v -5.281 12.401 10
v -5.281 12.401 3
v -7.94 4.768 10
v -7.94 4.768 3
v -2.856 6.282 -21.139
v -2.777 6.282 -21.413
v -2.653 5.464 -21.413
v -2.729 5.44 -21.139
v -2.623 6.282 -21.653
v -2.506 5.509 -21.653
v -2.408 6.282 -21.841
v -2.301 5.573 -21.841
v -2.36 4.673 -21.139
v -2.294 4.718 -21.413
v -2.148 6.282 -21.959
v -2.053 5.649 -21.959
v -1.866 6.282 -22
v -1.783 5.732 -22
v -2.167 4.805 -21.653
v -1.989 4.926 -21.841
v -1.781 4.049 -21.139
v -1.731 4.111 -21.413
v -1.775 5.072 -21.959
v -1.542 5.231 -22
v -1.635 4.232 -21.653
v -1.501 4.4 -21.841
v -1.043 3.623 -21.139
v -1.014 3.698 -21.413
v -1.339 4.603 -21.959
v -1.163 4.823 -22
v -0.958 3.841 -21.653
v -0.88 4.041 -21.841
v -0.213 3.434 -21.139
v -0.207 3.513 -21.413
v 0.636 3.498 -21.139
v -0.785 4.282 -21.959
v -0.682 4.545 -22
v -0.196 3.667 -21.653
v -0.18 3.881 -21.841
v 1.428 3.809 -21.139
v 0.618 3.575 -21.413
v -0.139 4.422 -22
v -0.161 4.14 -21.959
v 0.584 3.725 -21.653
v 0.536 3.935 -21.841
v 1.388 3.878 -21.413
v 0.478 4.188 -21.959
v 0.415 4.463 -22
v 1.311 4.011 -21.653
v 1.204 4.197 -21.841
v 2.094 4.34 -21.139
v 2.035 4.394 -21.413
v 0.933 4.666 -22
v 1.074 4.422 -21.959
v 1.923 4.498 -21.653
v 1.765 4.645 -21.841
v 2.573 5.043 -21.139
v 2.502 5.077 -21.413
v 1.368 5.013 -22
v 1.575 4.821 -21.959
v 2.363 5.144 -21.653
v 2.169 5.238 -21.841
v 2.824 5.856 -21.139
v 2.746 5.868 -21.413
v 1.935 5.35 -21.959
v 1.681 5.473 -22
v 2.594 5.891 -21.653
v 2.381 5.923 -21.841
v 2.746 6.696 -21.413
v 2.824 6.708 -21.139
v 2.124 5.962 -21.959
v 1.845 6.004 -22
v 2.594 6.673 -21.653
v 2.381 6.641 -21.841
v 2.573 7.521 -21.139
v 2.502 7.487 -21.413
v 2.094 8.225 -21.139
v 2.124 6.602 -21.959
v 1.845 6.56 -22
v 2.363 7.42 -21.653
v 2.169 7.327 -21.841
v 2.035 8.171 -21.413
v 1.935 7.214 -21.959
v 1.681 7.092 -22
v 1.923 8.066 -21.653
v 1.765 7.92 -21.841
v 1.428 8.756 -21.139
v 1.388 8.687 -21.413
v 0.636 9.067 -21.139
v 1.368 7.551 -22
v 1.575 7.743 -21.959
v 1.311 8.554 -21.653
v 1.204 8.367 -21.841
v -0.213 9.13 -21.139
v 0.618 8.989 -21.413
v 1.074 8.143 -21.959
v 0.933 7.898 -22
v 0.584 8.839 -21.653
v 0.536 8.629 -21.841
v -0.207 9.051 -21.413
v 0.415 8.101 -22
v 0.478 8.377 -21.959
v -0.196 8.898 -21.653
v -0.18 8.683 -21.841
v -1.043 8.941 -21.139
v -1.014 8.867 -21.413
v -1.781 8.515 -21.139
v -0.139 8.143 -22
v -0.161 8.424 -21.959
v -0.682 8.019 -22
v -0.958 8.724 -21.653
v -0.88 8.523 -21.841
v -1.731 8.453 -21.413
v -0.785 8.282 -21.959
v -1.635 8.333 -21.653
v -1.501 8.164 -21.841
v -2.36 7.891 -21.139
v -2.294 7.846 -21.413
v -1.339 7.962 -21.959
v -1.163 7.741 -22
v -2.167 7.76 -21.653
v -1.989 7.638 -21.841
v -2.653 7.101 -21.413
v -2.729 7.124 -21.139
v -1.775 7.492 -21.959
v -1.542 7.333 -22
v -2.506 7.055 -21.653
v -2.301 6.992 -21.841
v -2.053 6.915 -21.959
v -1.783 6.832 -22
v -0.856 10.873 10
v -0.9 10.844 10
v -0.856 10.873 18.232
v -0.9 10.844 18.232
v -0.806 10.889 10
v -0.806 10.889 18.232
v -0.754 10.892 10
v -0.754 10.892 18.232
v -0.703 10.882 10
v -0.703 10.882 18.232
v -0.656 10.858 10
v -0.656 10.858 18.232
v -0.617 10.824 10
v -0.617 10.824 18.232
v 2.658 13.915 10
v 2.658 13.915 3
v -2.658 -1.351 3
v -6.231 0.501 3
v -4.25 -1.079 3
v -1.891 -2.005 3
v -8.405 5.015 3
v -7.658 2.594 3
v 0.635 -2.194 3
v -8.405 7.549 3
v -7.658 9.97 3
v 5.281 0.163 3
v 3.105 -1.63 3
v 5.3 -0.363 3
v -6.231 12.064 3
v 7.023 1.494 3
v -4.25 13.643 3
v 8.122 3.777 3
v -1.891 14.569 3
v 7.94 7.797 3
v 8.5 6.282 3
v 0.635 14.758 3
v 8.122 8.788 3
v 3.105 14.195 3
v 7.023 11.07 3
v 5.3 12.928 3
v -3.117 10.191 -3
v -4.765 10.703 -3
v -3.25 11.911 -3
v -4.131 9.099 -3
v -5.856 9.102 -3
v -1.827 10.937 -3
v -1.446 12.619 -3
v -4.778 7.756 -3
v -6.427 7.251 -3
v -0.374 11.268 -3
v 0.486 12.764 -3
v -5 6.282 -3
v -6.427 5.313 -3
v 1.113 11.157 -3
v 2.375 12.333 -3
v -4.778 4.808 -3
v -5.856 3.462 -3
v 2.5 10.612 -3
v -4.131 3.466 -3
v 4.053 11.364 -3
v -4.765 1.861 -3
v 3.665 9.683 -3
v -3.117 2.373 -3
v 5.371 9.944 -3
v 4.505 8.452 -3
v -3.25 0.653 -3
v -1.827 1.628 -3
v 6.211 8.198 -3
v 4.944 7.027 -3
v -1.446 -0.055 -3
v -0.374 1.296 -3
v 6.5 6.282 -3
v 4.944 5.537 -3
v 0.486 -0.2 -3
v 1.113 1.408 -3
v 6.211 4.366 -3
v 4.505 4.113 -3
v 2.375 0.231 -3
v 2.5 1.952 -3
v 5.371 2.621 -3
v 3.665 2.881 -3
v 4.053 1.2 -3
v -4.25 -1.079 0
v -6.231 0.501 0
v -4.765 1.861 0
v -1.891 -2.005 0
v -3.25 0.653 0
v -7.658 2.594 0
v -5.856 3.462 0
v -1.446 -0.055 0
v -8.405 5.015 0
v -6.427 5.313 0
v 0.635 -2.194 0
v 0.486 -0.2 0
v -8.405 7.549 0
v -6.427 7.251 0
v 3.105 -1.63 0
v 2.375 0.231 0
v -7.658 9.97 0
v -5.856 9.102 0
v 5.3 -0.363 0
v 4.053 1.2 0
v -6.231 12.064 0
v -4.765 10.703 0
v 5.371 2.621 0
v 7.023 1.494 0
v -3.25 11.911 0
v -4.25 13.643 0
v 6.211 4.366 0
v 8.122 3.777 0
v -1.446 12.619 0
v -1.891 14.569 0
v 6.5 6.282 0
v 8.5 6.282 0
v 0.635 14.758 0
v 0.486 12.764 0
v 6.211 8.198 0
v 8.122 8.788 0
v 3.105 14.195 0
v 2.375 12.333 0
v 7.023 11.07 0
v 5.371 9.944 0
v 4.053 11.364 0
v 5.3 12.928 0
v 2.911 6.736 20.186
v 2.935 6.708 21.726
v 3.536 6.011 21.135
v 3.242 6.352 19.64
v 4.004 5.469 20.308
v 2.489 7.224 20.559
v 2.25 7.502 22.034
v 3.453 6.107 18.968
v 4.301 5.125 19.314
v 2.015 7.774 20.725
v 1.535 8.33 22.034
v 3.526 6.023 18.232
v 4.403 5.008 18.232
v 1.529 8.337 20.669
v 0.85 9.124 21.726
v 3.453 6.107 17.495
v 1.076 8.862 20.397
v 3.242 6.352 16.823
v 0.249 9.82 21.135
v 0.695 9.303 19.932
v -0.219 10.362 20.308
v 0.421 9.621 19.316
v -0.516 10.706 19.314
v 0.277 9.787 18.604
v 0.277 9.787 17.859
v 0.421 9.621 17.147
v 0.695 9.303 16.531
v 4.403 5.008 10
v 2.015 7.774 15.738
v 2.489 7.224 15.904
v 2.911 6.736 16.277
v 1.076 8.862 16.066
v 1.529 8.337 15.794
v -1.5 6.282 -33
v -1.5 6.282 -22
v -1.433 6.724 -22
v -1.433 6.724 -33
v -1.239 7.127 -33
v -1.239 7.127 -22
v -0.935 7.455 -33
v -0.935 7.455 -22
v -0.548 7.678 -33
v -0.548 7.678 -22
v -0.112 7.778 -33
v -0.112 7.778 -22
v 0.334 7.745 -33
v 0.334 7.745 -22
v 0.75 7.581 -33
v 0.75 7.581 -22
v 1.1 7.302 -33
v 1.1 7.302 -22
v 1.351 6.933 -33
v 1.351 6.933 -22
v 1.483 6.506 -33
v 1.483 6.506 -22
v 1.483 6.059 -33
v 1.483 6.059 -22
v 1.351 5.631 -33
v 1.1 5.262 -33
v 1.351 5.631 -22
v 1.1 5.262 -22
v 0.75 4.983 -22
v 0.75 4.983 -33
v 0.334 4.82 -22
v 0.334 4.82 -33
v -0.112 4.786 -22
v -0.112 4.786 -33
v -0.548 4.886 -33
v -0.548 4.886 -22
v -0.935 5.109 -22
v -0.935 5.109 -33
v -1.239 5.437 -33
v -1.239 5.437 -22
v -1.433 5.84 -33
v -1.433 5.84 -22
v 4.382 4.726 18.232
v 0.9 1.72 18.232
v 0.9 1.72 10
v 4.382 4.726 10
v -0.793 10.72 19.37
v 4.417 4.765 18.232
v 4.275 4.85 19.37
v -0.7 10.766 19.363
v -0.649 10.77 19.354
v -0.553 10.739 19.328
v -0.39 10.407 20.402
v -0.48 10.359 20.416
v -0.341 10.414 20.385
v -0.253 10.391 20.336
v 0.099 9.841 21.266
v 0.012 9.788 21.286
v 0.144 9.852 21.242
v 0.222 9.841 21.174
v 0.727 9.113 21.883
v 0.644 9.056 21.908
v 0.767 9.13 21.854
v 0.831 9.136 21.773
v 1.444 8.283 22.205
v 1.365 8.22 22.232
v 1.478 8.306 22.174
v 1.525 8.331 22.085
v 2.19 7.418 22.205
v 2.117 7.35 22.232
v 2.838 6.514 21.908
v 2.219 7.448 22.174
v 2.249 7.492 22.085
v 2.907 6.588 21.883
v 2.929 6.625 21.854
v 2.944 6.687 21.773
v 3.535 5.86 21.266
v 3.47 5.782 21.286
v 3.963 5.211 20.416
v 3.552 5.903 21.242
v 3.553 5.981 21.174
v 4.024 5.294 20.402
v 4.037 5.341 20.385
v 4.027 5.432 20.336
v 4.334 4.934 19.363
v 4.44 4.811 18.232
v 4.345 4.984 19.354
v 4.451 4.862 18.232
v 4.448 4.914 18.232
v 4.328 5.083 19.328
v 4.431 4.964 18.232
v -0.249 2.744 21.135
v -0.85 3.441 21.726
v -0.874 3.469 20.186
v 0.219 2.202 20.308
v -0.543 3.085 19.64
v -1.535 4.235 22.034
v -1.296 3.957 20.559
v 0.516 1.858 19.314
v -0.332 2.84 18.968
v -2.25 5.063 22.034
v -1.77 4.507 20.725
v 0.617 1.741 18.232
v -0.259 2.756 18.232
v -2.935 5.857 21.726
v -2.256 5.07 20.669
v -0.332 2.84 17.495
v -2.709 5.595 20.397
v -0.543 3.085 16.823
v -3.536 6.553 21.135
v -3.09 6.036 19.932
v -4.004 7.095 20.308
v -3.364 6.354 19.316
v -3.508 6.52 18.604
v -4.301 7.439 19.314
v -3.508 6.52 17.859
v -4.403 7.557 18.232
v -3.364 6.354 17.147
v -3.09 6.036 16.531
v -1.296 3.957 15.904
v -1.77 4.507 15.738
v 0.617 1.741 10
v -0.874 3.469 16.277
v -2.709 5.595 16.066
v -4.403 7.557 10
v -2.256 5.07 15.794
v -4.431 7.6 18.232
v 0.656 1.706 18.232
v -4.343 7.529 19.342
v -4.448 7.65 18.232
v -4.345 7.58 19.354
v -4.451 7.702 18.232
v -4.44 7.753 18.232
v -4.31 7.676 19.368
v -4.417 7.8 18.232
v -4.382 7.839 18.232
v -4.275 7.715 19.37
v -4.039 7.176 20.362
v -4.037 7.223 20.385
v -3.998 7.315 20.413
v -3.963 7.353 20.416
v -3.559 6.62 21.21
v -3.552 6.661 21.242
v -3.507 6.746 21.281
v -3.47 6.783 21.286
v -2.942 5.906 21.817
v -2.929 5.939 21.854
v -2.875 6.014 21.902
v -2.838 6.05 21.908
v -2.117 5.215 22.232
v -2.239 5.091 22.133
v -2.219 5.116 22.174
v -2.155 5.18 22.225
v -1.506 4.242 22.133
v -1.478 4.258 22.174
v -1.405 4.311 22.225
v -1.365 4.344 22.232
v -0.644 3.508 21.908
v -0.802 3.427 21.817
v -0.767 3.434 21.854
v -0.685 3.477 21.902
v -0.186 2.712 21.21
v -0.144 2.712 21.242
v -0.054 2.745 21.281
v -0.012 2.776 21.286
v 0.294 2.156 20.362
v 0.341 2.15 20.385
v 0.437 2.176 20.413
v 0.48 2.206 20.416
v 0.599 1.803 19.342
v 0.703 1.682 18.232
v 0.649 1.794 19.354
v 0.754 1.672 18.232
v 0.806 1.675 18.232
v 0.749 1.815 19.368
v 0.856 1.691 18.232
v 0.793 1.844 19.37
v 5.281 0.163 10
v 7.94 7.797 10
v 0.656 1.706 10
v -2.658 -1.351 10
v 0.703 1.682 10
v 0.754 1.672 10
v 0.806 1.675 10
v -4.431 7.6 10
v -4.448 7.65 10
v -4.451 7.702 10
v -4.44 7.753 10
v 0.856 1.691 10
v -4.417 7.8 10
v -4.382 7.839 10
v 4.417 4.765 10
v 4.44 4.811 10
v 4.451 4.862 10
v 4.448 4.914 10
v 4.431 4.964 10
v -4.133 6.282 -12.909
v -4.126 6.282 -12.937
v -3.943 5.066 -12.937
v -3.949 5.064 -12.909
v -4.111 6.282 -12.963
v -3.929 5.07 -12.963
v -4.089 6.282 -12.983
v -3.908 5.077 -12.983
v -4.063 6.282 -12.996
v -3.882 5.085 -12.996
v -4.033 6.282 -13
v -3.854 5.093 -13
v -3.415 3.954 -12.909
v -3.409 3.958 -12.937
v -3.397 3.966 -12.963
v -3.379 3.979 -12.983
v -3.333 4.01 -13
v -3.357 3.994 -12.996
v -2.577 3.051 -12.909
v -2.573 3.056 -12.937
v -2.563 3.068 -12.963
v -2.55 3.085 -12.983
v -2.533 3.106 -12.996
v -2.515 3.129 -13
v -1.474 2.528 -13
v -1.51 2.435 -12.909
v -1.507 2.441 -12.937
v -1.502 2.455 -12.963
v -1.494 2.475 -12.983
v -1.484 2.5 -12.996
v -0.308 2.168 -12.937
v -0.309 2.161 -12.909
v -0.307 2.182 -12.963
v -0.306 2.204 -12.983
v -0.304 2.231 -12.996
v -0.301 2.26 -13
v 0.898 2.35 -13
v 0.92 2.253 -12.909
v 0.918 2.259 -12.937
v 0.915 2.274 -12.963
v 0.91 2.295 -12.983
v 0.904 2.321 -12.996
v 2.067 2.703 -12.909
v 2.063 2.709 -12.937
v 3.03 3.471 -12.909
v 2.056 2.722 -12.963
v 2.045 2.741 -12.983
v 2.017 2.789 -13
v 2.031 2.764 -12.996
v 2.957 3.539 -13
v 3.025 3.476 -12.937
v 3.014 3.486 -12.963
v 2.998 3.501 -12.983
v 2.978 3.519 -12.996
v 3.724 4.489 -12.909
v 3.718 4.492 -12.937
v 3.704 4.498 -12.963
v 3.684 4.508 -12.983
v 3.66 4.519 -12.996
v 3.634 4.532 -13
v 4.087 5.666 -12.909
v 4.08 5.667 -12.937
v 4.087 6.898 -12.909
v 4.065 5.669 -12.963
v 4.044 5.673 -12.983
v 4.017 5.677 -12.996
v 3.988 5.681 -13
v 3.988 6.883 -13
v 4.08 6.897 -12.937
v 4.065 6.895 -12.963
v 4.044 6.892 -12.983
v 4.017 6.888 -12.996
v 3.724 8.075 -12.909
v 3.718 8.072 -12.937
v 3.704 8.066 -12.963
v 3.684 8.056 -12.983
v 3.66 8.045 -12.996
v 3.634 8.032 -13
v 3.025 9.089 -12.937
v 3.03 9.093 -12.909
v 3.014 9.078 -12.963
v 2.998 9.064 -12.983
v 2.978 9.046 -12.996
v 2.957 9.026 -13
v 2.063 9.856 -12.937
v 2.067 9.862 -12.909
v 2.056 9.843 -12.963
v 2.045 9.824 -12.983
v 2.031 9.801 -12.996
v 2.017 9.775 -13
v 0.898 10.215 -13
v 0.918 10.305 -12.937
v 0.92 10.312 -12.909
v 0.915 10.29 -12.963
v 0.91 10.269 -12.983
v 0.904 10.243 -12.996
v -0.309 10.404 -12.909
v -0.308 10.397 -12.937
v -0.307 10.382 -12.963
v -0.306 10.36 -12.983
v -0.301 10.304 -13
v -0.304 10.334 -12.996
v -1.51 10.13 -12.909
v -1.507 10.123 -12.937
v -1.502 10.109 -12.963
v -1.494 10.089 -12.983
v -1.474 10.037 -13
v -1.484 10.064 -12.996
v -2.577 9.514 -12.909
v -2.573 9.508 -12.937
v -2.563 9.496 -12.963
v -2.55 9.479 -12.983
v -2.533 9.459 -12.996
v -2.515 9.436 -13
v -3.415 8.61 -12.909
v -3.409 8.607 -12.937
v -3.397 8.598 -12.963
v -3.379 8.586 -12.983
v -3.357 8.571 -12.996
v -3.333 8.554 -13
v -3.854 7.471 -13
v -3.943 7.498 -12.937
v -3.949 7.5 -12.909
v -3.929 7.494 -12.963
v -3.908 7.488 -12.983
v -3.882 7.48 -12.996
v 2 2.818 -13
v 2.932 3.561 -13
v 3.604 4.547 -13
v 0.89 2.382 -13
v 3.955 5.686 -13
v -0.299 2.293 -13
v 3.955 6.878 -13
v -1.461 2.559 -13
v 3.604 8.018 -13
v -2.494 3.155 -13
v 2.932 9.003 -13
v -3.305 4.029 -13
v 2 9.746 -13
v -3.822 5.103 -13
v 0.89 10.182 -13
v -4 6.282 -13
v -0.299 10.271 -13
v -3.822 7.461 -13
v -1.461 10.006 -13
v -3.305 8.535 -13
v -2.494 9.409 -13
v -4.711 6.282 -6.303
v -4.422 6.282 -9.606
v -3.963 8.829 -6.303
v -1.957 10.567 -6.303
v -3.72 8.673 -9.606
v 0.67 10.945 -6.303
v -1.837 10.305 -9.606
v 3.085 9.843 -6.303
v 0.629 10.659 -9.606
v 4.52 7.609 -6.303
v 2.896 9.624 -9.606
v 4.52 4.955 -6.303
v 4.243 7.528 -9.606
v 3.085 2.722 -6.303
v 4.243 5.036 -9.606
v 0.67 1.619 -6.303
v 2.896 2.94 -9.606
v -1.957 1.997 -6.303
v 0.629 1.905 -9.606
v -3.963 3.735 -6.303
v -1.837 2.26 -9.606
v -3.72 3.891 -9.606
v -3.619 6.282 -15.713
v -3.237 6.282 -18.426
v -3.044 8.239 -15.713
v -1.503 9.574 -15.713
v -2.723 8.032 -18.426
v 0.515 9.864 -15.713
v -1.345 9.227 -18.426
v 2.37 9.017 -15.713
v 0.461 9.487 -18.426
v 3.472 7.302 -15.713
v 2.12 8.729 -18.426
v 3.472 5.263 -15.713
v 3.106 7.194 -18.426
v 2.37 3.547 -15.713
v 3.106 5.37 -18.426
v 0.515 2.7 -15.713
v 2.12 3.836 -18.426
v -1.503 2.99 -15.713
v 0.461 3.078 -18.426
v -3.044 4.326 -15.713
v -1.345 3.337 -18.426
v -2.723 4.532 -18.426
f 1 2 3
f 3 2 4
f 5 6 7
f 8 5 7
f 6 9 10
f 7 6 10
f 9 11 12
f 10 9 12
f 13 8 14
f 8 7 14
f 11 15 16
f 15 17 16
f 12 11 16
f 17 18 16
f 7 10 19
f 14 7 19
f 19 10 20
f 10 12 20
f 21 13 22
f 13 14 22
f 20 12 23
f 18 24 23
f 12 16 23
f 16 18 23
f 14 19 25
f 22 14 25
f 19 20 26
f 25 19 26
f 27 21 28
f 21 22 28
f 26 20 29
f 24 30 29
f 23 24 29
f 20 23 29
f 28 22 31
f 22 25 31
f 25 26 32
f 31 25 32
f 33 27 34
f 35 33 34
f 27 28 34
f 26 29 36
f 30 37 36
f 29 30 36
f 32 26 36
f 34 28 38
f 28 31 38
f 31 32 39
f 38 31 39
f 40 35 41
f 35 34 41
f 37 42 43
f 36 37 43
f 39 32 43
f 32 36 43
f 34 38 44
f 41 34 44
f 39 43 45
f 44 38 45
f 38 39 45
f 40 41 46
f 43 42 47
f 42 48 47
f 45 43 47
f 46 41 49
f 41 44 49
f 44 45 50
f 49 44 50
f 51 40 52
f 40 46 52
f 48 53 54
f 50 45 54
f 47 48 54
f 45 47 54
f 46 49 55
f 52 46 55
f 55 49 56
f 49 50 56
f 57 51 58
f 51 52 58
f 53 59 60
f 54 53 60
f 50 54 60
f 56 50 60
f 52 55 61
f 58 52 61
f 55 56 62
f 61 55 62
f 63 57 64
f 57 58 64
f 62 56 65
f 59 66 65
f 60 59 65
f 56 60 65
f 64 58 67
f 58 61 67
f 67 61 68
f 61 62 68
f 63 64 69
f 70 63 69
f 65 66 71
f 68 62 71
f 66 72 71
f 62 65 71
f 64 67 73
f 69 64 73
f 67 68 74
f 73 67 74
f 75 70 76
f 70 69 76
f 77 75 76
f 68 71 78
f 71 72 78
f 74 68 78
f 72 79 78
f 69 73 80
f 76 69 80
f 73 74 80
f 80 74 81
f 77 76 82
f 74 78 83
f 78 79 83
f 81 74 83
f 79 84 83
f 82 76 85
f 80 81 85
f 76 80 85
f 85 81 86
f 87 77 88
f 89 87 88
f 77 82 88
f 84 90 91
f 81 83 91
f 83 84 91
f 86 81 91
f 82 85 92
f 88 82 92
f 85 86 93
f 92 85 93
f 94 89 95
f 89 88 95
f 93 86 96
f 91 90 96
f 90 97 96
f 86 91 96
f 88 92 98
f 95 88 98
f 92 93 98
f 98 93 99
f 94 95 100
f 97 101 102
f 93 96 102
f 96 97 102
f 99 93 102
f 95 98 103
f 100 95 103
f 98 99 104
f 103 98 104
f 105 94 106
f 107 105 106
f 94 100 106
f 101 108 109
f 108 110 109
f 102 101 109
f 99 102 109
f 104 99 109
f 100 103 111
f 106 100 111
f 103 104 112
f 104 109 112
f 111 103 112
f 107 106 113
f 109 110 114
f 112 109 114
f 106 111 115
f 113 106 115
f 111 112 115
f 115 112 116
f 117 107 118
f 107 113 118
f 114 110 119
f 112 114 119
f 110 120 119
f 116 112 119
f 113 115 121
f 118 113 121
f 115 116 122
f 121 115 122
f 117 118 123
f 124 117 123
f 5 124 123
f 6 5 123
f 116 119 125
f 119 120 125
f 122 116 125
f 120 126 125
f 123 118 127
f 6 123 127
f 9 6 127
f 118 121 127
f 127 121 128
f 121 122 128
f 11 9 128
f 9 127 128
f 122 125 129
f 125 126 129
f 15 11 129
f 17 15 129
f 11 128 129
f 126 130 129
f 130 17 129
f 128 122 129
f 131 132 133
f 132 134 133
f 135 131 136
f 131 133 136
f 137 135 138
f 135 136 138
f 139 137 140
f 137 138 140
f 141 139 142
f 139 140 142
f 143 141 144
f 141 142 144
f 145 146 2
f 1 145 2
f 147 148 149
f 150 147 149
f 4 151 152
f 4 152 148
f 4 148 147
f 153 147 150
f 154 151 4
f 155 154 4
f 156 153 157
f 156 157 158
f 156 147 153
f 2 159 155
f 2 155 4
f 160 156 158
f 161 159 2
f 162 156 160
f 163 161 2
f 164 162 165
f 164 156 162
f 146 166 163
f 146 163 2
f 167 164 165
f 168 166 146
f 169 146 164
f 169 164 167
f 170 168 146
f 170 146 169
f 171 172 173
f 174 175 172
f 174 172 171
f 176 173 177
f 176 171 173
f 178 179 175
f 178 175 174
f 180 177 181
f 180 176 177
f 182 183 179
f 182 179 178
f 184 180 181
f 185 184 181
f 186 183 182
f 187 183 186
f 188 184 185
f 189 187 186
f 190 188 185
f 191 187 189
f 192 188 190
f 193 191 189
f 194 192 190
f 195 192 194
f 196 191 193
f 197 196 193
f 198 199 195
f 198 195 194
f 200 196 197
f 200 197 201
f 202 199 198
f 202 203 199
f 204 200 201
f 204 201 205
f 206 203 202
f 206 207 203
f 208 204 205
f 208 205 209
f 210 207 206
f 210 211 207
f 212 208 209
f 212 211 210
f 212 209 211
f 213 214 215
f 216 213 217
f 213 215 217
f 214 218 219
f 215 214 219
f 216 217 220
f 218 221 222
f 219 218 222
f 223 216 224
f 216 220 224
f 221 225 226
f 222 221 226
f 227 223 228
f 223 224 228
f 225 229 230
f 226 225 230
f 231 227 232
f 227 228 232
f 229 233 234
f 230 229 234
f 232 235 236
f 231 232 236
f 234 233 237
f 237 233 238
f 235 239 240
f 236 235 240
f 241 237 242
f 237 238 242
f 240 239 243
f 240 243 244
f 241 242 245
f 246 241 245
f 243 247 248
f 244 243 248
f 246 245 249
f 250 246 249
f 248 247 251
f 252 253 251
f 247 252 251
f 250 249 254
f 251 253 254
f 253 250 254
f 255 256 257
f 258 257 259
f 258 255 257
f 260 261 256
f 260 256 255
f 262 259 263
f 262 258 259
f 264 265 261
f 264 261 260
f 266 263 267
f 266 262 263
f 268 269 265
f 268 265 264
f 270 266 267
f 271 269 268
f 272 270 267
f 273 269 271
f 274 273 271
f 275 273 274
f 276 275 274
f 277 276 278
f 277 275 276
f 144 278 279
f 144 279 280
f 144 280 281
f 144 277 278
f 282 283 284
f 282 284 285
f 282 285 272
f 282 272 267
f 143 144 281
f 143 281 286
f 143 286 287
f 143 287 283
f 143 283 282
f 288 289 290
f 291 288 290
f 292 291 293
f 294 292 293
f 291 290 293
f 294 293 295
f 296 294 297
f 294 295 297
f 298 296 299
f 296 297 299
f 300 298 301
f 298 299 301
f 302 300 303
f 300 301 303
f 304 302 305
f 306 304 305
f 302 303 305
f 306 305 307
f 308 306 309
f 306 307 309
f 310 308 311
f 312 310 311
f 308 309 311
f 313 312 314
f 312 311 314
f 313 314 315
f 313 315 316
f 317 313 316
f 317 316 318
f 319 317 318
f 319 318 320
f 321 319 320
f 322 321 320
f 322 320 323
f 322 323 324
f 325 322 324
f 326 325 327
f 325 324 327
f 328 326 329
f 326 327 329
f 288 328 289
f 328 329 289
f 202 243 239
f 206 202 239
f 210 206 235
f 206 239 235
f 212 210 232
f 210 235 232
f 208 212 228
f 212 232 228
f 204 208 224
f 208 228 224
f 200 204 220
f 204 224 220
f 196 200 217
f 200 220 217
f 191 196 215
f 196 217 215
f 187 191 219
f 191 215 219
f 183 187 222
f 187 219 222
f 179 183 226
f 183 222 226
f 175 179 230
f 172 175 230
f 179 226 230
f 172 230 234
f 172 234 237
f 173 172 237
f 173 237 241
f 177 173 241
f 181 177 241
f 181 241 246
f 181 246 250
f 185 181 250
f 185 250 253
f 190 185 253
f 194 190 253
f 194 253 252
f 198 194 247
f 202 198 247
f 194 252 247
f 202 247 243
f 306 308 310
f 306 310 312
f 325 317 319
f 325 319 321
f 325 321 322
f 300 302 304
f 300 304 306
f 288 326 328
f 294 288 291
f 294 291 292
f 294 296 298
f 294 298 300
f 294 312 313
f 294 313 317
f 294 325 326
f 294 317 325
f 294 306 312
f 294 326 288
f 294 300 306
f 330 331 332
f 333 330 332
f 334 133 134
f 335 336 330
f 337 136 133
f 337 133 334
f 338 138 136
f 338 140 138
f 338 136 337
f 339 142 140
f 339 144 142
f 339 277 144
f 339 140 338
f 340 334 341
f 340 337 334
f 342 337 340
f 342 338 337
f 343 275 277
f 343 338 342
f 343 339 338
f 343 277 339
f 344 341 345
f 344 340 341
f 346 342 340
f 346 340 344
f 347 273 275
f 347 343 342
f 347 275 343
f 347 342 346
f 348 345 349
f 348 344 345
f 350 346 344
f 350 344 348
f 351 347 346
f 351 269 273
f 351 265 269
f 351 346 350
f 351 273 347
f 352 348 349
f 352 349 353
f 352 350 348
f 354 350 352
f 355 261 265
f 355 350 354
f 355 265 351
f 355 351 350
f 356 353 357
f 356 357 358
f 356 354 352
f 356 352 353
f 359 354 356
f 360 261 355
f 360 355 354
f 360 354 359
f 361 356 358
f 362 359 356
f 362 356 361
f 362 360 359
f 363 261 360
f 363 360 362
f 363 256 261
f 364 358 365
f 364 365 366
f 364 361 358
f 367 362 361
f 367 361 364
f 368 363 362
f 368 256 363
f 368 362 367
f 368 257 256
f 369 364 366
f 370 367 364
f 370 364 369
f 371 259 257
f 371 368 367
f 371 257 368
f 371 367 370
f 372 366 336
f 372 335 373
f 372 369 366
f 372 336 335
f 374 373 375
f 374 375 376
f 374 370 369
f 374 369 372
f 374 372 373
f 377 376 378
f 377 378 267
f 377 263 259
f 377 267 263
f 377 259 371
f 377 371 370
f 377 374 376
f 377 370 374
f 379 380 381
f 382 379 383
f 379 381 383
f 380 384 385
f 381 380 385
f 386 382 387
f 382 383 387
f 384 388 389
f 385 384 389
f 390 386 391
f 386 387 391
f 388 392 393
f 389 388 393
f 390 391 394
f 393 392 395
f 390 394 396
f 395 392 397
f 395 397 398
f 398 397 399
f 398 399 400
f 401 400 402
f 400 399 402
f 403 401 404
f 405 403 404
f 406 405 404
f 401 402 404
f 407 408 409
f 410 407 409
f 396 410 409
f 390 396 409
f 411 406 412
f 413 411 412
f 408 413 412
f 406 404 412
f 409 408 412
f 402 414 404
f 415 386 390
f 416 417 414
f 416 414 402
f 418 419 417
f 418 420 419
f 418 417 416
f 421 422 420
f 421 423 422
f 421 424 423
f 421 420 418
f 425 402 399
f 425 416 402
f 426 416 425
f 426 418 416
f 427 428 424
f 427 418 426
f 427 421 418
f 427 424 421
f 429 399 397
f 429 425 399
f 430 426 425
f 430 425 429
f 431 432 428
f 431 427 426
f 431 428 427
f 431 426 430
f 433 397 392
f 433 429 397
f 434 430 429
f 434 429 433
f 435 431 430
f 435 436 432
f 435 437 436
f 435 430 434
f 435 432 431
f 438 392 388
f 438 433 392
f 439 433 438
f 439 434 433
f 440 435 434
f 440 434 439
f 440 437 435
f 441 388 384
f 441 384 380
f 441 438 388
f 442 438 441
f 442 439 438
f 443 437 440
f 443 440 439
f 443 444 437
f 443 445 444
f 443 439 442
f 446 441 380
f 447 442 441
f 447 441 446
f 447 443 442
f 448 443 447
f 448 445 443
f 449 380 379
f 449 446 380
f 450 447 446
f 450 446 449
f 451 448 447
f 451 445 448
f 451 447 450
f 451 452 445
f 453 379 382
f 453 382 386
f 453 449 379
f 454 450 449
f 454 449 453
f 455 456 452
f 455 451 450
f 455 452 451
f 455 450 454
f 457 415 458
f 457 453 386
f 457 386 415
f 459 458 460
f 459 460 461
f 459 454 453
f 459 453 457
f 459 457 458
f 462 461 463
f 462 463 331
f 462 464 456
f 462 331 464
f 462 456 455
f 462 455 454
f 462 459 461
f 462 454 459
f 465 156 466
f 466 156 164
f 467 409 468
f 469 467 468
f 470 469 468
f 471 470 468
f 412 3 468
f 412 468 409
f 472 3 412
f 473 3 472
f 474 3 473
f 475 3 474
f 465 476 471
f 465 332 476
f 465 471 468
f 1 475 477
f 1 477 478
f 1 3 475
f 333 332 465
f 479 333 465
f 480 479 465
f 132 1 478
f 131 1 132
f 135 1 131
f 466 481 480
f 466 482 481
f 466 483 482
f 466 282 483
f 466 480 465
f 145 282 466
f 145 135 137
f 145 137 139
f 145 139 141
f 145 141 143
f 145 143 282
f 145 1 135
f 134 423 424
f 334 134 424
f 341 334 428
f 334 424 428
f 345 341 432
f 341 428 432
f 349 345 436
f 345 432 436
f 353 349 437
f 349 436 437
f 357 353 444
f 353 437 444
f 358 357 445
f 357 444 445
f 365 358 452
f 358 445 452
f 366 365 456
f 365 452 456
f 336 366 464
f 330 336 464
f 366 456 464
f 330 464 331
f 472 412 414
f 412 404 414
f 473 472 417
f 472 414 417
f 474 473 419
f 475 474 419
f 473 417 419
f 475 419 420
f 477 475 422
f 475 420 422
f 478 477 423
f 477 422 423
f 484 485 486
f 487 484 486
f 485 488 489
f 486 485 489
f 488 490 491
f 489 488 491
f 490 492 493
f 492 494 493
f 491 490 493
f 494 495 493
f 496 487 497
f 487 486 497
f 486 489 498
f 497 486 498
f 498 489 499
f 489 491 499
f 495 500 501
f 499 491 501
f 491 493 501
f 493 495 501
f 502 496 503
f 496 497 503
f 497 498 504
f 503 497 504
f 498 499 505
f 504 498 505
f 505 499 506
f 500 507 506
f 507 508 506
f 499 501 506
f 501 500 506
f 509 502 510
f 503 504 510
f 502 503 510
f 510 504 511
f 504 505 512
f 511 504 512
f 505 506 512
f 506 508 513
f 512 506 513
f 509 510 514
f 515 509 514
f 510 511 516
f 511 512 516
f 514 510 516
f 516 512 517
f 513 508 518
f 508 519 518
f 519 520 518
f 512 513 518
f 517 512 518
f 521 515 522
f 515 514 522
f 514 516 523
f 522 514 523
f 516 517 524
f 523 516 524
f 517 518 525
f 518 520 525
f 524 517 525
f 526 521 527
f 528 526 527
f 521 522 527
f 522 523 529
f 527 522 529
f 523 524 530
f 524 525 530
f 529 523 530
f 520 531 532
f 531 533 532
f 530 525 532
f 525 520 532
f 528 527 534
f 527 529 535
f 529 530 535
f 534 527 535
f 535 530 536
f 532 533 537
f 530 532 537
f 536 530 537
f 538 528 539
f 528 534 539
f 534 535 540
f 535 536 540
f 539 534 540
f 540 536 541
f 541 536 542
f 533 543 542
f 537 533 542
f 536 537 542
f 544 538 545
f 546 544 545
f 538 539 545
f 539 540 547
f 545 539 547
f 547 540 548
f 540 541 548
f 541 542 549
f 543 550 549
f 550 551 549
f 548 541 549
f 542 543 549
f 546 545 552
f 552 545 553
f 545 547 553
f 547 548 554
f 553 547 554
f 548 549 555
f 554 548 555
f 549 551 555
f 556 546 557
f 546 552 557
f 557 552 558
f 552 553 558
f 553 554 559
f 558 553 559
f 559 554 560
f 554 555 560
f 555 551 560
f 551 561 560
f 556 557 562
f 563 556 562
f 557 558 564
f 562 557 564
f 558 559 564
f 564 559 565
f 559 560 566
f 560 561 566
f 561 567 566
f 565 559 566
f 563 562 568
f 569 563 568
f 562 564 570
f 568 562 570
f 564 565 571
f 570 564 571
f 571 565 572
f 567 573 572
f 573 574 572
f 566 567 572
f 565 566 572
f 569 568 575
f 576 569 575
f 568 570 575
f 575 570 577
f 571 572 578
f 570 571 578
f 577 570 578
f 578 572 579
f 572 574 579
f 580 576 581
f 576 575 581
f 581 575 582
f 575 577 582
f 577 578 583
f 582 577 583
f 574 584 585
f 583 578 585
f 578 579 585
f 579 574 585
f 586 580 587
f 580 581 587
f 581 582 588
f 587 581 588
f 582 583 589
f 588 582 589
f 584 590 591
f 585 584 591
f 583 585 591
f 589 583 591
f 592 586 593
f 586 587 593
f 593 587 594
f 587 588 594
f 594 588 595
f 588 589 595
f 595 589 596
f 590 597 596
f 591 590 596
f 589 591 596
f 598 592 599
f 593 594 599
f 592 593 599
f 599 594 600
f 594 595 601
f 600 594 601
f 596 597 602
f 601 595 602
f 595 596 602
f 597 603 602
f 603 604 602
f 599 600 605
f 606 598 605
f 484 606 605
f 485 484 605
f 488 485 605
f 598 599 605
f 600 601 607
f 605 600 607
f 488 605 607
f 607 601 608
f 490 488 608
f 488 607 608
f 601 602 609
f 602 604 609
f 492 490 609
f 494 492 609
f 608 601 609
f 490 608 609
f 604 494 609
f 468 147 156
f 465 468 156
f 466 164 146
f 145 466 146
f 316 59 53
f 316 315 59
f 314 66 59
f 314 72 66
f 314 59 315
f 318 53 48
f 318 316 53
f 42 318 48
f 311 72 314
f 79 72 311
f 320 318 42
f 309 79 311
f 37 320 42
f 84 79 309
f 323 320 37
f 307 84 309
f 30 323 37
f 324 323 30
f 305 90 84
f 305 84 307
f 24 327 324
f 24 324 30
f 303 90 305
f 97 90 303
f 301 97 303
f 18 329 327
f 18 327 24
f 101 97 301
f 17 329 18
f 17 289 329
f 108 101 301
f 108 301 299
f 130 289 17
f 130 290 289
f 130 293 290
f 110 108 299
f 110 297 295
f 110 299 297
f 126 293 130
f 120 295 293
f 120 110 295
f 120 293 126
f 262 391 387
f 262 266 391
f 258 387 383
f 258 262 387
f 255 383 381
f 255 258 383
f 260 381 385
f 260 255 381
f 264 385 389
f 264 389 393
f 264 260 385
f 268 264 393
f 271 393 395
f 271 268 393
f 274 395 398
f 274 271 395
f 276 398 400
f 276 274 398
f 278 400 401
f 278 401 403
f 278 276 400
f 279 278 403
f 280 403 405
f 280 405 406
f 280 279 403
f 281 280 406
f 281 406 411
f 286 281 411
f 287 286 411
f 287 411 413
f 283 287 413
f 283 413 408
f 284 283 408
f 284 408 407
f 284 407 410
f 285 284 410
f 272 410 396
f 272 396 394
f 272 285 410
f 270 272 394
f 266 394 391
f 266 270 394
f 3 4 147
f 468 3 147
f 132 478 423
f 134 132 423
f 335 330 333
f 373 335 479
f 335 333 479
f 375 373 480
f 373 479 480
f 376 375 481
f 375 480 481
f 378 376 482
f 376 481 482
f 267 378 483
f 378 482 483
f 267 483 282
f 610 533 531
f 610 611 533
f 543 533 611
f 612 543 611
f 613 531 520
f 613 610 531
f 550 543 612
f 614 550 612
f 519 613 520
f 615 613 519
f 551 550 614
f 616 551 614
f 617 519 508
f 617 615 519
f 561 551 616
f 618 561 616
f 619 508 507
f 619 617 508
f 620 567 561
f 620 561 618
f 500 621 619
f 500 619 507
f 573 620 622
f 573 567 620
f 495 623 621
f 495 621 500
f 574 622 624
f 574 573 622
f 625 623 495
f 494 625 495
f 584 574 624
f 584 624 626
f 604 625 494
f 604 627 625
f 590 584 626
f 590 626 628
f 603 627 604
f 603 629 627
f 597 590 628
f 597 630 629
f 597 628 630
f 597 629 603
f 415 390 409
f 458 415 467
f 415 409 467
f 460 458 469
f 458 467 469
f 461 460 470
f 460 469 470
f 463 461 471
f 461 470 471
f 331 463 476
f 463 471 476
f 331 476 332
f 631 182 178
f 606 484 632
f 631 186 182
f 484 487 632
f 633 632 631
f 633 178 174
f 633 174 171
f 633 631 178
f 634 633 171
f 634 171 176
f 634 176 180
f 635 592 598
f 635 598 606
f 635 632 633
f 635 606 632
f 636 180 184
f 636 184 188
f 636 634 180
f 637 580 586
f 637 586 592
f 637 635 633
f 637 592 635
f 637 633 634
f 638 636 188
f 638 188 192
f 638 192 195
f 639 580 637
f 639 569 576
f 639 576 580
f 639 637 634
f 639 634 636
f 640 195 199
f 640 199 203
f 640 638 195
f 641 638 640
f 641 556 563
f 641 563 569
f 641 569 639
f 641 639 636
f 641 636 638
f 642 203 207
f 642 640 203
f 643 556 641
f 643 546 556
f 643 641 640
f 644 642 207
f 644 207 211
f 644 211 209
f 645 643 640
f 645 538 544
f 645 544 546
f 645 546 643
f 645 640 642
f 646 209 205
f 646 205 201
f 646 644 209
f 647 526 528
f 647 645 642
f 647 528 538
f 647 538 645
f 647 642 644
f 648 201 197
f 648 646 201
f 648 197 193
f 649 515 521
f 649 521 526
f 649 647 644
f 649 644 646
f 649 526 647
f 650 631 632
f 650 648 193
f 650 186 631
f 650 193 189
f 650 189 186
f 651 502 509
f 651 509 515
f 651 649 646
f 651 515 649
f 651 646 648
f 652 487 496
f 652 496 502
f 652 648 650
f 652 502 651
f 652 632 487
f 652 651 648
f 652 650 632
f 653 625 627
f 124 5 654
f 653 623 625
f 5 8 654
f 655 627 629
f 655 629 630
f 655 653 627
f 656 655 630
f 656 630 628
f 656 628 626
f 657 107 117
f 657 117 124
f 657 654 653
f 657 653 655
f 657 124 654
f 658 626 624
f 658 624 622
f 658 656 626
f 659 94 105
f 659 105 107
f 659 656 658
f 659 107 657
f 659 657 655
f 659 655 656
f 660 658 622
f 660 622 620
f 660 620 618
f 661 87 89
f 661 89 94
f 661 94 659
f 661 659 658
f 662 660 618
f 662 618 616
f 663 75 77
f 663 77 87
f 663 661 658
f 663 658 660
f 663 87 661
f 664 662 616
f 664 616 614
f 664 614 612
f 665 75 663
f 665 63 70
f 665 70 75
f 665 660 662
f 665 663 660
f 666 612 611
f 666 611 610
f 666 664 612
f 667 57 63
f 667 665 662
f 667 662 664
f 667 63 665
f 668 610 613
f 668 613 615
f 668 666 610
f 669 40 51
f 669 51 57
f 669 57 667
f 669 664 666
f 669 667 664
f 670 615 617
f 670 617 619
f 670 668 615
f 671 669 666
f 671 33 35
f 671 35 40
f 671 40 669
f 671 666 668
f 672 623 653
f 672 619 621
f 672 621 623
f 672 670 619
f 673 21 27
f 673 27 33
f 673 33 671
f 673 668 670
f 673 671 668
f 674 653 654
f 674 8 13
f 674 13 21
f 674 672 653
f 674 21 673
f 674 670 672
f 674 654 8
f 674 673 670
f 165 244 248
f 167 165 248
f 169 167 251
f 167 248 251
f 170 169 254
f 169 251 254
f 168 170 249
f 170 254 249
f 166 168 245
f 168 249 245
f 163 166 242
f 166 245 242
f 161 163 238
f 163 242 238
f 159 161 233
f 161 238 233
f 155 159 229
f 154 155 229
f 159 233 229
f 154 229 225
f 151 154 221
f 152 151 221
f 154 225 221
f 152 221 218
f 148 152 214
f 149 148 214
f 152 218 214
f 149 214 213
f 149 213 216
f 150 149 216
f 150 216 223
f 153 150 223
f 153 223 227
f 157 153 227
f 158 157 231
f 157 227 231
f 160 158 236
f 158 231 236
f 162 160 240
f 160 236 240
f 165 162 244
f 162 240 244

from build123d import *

# Parameters (mm, degrees)
SKETCH_1_R      = 8.5
EXTRUDE_1_DEPTH = 3
EXTRUDE_2_DEPTH = 7
SKETCH_3_R      = 6.5
EXTRUDE_3_DEPTH = 3
SKETCH_4_R      = 5
EXTRUDE_4_DEPTH = 10
EXTRUDE_4_TAPER = 5
SKETCH_5_R      = 4
EXTRUDE_5_DEPTH = 9
EXTRUDE_5_TAPER = 8
FILLET_1_R      = 0.1
FILLET_2_R      = 1
SKETCH_7_R      = 2.5
EXTRUDE_6_DEPTH = 2.5
FILLET_3_R      = 0.2
SKETCH_8_R      = 1.5
EXTRUDE_7_DEPTH = 11


with BuildPart() as part:
    # 草图1 → 凸台-拉伸1 (new body)
    with BuildSketch(Plane.XY):
        with Locations((0, 6.282173928)):
            Circle(SKETCH_1_R)
    extrude(amount=EXTRUDE_1_DEPTH)

    # 草图2 → 凸台-拉伸2 (add)
    with BuildSketch(Plane.XY.offset(3)):
        Polygon((5.281387937, 0.163328057), (7.939769935, 7.796567113), (2.658381997, 13.915412984), (-5.281387937, 12.401019799), (-7.939769935, 4.767780743), (-2.658381997, -1.351065128), align=None)
    extrude(amount=EXTRUDE_2_DEPTH)

    # 草图3 → 凸台-拉伸3 (add)
    with BuildSketch(Plane(origin=(0, 0, 0), x_dir=(-1, 0, 0), z_dir=(0, 0, -1))):
        with Locations(Location((0, 6.282173928, 0), (0, 0, 180))):
            Circle(SKETCH_3_R)
    extrude(amount=EXTRUDE_3_DEPTH)

    # 草图4 → 凸台-拉伸4 (add)
    with BuildSketch(Plane(origin=(0, 0, -3), x_dir=(-1, 0, 0), z_dir=(0, 0, -1))):
        with Locations((0, 6.282173928)):
            Circle(SKETCH_4_R)
    extrude(amount=EXTRUDE_4_DEPTH, taper=EXTRUDE_4_TAPER)

    # 草图5 → 凸台-拉伸5 (add)
    with BuildSketch(Plane(origin=(0, 0, -13), x_dir=(-1, 0, 0), z_dir=(0, 0, -1))):
        with Locations((0, 6.282173928)):
            Circle(SKETCH_5_R)
    extrude(amount=EXTRUDE_5_DEPTH, taper=EXTRUDE_5_TAPER)

    # 圆角1
    fillet_1_edges = [part.edges().sort_by_distance(p)[0] for p in [
        (4.125113365, 6.282173928, -13),
    ]]
    fillet(fillet_1_edges, radius=FILLET_1_R)

    # 圆角2
    fillet_2_edges = [part.edges().sort_by_distance(p)[0] for p in [
        (2.735132488, 6.282173928, -22),
    ]]
    fillet(fillet_2_edges, radius=FILLET_2_R)

    # 草图7 → 凸台-拉伸6 (add, symmetric)
    with BuildSketch(Plane(origin=(3.107368239, 2.682077222, 0), x_dir=(0, 0, 1), z_dir=(-0.7570108522857268, -0.6534023029662793, 0))):
        with BuildLine():
            Line((10, 8.797125724), (18.23150741, 8.797125724))
            ThreePointArc((18.23150741, 8.797125724), (22.272959294, 4.755673839), (18.23150741, 0.714221955))
            Line((18.23150741, 0.714221955), (10, 0.714221955))
            Line((10, 0.714221955), (10, 8.797125724))
        make_face()
        with Locations(Location((18.23150741, 4.755673839, 0), (0, 0, 270))):
            Circle(SKETCH_7_R, mode=Mode.SUBTRACT)
    extrude(amount=EXTRUDE_6_DEPTH, both=True)

    # 圆角3
    fillet_3_edges = [part.edges().sort_by_distance(p)[0] for p in [
        (0.748166838, 1.589245235, 14.115753705),
        (-1.892527131, 4.648668171, 22.272959294),
        (-4.533221099, 7.708091106, 14.115753705),
        (4.533221099, 4.85625675, 14.115753705),
        (1.892527131, 7.915679685, 22.272959294),
        (-0.748166838, 10.975102621, 14.115753705),
    ]]
    fillet(fillet_3_edges, radius=FILLET_3_R)

    # 草图8 → 凸台-拉伸7 (add)
    with BuildSketch(Plane(origin=(0, 0, -22), x_dir=(-1, 0, 0), z_dir=(0, 0, -1))):
        with Locations((0, 6.282173928)):
            Circle(SKETCH_8_R)
    extrude(amount=EXTRUDE_7_DEPTH)


solid = part.part
